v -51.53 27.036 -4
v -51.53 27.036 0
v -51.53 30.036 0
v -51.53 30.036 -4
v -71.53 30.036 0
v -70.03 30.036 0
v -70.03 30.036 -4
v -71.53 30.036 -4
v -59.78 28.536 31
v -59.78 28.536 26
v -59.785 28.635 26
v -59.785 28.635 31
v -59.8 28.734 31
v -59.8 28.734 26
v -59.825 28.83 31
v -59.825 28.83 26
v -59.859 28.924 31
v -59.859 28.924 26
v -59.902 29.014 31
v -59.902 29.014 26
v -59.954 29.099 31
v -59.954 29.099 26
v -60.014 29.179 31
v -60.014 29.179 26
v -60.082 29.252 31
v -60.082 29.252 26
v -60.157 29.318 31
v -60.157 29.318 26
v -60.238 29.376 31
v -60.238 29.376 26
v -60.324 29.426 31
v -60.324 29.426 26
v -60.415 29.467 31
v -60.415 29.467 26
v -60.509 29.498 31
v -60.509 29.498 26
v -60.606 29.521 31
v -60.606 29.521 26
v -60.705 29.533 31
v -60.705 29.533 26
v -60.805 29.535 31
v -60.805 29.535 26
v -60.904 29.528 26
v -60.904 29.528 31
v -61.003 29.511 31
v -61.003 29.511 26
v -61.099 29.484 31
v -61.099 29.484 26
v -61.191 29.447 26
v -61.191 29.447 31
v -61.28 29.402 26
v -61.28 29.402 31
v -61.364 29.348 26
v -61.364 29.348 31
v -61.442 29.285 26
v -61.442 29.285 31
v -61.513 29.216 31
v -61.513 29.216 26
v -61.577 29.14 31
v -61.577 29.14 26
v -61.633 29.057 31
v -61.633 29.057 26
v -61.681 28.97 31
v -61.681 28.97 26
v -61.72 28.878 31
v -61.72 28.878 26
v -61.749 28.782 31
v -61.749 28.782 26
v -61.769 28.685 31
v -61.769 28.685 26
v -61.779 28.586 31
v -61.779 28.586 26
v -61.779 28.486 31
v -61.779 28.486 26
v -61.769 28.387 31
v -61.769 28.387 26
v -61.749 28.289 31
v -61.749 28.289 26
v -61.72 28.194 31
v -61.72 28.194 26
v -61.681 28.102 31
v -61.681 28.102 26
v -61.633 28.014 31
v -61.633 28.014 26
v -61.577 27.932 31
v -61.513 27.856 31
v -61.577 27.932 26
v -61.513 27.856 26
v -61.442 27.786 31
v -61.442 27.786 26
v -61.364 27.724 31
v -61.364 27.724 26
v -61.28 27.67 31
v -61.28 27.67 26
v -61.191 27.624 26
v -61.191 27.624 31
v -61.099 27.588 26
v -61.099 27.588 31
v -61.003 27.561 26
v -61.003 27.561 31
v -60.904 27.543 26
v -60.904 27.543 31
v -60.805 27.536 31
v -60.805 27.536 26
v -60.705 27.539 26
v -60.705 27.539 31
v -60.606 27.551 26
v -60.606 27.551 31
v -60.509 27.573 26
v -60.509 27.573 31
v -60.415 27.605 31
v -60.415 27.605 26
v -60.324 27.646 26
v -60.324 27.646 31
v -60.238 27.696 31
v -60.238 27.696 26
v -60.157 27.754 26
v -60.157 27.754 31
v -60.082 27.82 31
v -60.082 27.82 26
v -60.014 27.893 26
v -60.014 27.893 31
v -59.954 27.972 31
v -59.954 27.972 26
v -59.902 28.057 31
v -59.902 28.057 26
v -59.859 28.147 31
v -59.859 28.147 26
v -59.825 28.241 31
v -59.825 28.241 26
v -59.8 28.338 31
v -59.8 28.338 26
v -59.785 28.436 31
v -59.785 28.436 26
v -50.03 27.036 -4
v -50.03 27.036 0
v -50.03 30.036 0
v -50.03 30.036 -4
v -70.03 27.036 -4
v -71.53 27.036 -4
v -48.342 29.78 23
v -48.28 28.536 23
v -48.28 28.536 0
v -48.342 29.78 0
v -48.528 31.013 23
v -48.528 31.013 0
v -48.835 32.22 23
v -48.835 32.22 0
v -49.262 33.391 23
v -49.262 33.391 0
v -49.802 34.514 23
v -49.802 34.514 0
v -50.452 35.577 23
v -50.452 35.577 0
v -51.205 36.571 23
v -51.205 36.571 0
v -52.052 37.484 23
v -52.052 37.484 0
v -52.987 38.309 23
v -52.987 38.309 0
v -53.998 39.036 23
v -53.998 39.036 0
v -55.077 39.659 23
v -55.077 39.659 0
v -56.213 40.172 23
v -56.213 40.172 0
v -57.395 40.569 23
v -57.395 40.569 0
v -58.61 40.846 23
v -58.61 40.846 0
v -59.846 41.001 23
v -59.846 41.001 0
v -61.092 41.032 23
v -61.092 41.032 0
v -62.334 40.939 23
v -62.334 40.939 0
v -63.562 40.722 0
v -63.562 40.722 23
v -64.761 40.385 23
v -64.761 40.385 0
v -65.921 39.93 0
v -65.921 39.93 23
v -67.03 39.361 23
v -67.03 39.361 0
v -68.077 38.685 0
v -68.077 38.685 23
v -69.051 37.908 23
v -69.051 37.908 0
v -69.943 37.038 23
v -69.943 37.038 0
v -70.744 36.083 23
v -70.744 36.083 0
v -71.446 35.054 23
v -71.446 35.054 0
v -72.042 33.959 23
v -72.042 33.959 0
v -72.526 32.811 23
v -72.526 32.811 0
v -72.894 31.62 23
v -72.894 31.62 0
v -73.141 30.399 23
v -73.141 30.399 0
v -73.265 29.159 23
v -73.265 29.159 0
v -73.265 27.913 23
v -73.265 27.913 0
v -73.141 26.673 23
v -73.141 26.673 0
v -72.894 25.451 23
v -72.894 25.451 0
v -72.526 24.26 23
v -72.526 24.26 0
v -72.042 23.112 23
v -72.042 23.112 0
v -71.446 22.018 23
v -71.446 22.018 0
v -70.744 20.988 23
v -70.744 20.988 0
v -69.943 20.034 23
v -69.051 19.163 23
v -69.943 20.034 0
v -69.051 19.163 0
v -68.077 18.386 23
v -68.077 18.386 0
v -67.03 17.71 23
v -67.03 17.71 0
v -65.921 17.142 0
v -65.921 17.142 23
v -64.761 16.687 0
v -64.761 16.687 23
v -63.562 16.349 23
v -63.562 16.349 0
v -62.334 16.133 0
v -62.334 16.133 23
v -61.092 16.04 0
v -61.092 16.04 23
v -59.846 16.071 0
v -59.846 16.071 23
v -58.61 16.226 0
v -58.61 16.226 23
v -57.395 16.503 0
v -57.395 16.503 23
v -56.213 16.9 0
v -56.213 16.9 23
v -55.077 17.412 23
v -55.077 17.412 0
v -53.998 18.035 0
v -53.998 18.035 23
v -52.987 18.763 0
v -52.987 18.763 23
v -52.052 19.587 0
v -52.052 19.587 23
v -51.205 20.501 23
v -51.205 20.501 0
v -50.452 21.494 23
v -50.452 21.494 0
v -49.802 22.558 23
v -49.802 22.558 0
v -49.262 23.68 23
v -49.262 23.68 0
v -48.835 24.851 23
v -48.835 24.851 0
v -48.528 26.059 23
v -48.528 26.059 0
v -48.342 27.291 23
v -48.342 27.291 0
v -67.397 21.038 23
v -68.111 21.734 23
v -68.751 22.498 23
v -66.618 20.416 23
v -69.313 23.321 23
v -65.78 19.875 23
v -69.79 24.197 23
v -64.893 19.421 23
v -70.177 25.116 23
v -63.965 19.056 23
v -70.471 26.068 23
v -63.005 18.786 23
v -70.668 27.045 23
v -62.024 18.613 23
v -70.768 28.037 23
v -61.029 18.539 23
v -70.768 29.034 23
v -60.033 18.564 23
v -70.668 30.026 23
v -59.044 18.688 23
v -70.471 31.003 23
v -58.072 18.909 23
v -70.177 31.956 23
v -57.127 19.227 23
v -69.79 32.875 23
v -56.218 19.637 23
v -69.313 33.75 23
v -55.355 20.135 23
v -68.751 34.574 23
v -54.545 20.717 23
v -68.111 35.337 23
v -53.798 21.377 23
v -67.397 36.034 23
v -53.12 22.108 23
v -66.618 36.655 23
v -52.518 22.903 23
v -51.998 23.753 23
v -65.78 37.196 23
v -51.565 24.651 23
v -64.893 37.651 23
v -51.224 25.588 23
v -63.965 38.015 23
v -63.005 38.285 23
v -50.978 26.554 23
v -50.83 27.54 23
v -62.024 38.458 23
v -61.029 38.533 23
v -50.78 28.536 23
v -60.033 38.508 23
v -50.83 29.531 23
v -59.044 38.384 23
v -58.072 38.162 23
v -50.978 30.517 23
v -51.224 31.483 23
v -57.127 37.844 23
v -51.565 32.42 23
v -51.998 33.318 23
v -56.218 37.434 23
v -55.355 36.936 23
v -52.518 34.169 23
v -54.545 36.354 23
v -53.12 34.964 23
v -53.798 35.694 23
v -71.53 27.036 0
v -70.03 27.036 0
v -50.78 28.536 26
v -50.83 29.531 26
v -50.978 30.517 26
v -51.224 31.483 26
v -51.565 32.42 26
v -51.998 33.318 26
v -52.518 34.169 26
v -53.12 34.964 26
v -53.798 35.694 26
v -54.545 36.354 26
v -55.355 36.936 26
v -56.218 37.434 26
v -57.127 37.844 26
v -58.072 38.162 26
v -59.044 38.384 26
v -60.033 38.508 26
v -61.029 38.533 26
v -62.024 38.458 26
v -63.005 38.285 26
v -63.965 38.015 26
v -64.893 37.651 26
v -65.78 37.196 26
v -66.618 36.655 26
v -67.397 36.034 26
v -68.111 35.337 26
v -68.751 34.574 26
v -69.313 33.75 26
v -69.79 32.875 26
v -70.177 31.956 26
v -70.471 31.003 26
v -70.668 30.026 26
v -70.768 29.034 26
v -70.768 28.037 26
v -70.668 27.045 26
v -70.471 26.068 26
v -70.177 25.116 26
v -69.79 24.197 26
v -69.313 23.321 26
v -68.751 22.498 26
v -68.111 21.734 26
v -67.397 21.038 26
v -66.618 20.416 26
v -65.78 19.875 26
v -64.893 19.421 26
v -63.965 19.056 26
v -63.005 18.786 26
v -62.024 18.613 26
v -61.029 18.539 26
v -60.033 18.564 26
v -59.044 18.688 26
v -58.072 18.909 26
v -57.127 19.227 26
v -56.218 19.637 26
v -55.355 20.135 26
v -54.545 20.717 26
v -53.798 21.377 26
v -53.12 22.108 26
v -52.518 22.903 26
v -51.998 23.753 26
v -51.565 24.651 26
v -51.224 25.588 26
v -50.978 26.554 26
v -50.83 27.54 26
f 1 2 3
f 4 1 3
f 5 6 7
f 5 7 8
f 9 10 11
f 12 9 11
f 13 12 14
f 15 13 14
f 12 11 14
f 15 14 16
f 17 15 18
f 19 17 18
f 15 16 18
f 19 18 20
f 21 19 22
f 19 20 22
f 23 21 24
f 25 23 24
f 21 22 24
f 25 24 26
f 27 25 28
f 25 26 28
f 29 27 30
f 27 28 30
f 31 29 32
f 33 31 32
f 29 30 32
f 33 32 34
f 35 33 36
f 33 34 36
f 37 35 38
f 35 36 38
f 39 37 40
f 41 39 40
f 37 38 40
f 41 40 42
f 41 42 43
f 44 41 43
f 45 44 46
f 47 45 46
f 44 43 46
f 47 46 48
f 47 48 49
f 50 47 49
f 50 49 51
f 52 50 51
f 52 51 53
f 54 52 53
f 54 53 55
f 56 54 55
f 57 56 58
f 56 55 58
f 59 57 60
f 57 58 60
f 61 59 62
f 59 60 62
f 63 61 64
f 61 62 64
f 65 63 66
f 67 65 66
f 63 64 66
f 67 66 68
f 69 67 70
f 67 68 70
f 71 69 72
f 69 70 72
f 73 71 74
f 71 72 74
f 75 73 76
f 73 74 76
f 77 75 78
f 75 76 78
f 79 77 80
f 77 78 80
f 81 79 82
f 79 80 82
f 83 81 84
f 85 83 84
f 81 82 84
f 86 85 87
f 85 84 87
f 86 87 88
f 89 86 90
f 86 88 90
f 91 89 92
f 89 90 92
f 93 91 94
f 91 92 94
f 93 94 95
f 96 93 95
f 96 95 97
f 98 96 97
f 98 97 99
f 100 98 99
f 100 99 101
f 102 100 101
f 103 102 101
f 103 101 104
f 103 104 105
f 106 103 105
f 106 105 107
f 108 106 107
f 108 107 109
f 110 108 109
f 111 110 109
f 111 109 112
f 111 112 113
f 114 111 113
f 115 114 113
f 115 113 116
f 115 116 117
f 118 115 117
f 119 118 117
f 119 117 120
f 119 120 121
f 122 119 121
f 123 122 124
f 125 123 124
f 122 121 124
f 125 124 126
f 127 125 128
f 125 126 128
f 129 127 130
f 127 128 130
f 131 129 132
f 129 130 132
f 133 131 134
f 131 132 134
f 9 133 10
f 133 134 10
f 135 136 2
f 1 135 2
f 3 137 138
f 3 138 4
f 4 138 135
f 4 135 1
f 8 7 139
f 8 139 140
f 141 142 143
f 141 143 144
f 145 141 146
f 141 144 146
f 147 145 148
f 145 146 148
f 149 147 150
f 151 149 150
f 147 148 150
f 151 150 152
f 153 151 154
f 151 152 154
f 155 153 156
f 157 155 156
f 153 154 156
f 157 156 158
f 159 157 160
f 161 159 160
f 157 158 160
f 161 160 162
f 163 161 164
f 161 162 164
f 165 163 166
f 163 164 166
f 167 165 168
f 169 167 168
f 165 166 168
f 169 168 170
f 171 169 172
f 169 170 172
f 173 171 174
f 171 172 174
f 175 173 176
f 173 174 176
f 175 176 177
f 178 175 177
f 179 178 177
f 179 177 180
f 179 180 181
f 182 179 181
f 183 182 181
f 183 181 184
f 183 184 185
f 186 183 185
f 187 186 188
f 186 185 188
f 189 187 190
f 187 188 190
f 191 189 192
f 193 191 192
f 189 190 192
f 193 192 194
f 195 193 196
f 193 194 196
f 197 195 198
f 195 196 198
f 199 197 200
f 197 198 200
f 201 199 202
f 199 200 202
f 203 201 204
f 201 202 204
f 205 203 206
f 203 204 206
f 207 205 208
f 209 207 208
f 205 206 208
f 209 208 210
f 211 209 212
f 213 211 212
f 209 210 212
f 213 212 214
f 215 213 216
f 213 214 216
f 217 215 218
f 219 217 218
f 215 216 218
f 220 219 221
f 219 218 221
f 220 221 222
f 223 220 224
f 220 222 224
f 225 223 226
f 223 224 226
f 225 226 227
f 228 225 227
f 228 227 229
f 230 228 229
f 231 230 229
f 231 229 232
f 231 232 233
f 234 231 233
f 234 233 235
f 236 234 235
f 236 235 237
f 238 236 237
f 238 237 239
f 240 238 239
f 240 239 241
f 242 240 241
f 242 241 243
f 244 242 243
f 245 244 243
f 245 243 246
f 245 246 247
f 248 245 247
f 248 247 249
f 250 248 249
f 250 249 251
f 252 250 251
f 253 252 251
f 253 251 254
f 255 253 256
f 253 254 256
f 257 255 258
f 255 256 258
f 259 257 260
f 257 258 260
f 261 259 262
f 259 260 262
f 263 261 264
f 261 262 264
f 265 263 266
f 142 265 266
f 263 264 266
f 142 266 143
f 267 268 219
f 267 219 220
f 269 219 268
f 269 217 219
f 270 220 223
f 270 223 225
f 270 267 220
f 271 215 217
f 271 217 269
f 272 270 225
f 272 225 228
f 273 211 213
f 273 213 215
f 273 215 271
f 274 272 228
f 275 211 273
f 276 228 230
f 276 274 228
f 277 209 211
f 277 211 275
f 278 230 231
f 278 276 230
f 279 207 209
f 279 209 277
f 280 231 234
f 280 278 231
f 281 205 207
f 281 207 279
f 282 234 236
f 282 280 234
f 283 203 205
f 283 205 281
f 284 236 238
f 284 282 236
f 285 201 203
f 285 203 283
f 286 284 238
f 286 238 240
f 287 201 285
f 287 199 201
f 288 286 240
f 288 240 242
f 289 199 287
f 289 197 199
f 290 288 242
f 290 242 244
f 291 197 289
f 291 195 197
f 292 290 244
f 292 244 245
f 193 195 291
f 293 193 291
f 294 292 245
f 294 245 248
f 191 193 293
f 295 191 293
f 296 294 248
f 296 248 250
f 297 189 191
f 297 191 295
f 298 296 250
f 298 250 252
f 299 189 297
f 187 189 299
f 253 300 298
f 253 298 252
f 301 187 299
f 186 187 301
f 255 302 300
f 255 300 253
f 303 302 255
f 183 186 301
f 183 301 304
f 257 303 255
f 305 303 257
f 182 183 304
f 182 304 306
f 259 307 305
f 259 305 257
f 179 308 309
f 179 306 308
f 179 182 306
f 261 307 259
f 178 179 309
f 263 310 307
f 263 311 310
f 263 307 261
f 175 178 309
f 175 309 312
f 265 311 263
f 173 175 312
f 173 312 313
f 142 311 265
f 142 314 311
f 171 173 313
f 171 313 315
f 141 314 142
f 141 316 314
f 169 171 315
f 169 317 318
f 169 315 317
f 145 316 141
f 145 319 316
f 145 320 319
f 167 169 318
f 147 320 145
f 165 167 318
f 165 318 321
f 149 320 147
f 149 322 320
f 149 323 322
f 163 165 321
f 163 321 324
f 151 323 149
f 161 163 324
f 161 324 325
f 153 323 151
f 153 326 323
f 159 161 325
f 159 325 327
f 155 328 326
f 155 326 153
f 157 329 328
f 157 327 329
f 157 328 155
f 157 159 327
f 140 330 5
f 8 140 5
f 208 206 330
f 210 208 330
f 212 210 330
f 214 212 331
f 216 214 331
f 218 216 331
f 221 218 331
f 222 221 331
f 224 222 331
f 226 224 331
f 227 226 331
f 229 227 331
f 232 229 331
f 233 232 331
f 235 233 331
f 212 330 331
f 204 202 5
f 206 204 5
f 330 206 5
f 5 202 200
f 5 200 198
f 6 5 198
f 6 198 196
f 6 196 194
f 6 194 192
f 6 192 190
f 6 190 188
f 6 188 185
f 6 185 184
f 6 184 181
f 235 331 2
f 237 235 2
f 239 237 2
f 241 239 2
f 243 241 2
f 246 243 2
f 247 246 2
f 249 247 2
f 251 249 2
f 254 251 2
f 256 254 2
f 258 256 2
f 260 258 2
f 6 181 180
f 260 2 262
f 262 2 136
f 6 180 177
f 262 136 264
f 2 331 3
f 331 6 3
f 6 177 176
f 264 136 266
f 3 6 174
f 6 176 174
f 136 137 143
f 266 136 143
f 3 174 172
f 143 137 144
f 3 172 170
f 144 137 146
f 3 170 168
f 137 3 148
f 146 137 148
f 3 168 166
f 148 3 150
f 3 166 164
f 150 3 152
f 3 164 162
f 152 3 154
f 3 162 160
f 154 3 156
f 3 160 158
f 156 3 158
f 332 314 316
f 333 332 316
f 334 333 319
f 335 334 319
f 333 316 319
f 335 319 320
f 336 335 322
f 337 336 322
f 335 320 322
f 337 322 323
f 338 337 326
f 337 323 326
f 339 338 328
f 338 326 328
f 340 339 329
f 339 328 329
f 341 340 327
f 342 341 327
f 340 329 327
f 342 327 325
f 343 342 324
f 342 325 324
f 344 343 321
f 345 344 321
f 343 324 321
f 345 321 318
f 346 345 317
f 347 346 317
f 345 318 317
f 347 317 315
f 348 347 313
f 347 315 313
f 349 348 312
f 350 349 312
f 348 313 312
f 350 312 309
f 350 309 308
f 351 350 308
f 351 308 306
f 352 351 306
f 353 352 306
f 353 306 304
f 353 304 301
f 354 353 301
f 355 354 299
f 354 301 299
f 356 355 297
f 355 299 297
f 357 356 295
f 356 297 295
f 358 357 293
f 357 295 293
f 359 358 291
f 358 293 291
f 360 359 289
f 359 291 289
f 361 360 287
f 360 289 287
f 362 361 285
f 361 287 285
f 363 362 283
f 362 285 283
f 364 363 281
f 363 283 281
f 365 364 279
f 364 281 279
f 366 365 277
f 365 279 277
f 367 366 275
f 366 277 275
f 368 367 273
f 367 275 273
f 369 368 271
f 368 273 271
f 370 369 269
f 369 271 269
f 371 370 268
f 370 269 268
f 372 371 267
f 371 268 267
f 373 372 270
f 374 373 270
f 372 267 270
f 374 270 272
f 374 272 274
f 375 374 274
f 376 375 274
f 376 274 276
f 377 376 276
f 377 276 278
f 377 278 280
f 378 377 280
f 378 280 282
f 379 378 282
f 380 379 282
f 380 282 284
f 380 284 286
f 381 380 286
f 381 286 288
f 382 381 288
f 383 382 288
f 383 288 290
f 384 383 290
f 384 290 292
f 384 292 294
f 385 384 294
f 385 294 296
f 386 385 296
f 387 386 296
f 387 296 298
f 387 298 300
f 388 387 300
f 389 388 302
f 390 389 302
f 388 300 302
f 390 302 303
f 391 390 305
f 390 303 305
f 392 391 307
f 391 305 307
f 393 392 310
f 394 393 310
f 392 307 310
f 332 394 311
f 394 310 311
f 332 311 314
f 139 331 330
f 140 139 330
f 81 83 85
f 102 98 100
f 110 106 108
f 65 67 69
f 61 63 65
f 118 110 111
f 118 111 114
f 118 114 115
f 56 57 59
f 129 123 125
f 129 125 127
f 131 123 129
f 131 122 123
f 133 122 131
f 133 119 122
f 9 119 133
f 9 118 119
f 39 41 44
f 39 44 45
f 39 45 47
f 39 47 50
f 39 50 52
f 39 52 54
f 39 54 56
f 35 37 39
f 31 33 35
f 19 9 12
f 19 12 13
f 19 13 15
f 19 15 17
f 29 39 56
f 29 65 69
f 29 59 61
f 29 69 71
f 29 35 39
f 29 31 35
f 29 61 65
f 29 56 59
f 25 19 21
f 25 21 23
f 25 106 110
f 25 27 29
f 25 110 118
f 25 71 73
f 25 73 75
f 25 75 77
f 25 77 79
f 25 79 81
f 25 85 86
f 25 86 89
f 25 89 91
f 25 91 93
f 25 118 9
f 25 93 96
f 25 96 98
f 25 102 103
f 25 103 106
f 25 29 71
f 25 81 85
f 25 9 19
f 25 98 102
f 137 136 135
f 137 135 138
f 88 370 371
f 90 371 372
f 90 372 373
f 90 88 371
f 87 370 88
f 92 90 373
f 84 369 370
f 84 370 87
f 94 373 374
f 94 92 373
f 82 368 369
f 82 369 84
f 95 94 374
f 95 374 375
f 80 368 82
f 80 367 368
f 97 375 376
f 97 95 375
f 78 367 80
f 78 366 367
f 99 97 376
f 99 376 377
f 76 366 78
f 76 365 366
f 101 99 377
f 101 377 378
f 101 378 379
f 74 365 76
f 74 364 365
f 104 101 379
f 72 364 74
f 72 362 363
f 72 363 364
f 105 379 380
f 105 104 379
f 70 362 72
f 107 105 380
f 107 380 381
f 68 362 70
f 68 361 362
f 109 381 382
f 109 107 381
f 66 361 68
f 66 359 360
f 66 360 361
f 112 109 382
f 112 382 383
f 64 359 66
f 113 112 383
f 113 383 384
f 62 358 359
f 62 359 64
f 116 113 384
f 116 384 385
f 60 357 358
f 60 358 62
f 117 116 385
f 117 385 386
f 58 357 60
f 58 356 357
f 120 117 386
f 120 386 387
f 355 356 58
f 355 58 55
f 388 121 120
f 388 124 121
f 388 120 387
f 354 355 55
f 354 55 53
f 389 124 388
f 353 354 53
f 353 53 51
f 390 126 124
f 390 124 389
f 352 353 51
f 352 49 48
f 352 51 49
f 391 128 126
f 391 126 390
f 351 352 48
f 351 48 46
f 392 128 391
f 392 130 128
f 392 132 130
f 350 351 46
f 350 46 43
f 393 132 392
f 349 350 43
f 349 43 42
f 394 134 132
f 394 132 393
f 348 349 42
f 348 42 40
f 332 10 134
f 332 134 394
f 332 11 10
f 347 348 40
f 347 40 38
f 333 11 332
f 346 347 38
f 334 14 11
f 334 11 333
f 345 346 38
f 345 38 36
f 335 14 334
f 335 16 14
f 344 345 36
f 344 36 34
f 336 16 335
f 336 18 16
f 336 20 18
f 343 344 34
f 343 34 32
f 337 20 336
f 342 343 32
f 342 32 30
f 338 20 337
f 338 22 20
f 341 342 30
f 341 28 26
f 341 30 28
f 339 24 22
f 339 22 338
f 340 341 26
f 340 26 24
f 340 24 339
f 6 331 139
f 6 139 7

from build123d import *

# Parameters (mm, degrees)
ESQUISSE1_R        = 12.5
BOSS_EXTRU_1_DEPTH = 23
ESQUISSE2_R        = 10
BOSS_EXTRU_2_DEPTH = 3
ESQUISSE3_R        = 1
BOSS_EXTRU_3_DEPTH = 5
ESQUISSE4_W        = 1.5
ESQUISSE4_H        = 3
BOSS_EXTRU_4_DEPTH = 4


with BuildPart() as part:
    # Esquisse1 → Boss.-Extru.1 (new body)
    with BuildSketch(Plane.XY):
        with Locations((-60.780131723, 28.535714286)):
            Circle(ESQUISSE1_R)
    extrude(amount=BOSS_EXTRU_1_DEPTH)

    # Esquisse2 → Boss.-Extru.2 (add)
    with BuildSketch(Plane.XY.offset(23)):
        with Locations((-60.780131723, 28.535714286)):
            Circle(ESQUISSE2_R)
    extrude(amount=BOSS_EXTRU_2_DEPTH)

    # Esquisse3 → Boss.-Extru.3 (add)
    with BuildSketch(Plane.XY.offset(26)):
        with Locations((-60.780131723, 28.535714286)):
            Circle(ESQUISSE3_R)
    extrude(amount=BOSS_EXTRU_3_DEPTH)

    # Esquisse4 → Boss.-Extru.4 (add)
    with BuildSketch(Plane(origin=(0, 0, 0), x_dir=(-1, 0, 0), z_dir=(0, 0, -1))):
        with Locations((70.780131723, 28.535714286)):
            Rectangle(ESQUISSE4_W, ESQUISSE4_H)
        with Locations((50.780131723, 28.535714286)):
            Rectangle(ESQUISSE4_W, ESQUISSE4_H)
    extrude(amount=BOSS_EXTRU_4_DEPTH)


solid = part.part
